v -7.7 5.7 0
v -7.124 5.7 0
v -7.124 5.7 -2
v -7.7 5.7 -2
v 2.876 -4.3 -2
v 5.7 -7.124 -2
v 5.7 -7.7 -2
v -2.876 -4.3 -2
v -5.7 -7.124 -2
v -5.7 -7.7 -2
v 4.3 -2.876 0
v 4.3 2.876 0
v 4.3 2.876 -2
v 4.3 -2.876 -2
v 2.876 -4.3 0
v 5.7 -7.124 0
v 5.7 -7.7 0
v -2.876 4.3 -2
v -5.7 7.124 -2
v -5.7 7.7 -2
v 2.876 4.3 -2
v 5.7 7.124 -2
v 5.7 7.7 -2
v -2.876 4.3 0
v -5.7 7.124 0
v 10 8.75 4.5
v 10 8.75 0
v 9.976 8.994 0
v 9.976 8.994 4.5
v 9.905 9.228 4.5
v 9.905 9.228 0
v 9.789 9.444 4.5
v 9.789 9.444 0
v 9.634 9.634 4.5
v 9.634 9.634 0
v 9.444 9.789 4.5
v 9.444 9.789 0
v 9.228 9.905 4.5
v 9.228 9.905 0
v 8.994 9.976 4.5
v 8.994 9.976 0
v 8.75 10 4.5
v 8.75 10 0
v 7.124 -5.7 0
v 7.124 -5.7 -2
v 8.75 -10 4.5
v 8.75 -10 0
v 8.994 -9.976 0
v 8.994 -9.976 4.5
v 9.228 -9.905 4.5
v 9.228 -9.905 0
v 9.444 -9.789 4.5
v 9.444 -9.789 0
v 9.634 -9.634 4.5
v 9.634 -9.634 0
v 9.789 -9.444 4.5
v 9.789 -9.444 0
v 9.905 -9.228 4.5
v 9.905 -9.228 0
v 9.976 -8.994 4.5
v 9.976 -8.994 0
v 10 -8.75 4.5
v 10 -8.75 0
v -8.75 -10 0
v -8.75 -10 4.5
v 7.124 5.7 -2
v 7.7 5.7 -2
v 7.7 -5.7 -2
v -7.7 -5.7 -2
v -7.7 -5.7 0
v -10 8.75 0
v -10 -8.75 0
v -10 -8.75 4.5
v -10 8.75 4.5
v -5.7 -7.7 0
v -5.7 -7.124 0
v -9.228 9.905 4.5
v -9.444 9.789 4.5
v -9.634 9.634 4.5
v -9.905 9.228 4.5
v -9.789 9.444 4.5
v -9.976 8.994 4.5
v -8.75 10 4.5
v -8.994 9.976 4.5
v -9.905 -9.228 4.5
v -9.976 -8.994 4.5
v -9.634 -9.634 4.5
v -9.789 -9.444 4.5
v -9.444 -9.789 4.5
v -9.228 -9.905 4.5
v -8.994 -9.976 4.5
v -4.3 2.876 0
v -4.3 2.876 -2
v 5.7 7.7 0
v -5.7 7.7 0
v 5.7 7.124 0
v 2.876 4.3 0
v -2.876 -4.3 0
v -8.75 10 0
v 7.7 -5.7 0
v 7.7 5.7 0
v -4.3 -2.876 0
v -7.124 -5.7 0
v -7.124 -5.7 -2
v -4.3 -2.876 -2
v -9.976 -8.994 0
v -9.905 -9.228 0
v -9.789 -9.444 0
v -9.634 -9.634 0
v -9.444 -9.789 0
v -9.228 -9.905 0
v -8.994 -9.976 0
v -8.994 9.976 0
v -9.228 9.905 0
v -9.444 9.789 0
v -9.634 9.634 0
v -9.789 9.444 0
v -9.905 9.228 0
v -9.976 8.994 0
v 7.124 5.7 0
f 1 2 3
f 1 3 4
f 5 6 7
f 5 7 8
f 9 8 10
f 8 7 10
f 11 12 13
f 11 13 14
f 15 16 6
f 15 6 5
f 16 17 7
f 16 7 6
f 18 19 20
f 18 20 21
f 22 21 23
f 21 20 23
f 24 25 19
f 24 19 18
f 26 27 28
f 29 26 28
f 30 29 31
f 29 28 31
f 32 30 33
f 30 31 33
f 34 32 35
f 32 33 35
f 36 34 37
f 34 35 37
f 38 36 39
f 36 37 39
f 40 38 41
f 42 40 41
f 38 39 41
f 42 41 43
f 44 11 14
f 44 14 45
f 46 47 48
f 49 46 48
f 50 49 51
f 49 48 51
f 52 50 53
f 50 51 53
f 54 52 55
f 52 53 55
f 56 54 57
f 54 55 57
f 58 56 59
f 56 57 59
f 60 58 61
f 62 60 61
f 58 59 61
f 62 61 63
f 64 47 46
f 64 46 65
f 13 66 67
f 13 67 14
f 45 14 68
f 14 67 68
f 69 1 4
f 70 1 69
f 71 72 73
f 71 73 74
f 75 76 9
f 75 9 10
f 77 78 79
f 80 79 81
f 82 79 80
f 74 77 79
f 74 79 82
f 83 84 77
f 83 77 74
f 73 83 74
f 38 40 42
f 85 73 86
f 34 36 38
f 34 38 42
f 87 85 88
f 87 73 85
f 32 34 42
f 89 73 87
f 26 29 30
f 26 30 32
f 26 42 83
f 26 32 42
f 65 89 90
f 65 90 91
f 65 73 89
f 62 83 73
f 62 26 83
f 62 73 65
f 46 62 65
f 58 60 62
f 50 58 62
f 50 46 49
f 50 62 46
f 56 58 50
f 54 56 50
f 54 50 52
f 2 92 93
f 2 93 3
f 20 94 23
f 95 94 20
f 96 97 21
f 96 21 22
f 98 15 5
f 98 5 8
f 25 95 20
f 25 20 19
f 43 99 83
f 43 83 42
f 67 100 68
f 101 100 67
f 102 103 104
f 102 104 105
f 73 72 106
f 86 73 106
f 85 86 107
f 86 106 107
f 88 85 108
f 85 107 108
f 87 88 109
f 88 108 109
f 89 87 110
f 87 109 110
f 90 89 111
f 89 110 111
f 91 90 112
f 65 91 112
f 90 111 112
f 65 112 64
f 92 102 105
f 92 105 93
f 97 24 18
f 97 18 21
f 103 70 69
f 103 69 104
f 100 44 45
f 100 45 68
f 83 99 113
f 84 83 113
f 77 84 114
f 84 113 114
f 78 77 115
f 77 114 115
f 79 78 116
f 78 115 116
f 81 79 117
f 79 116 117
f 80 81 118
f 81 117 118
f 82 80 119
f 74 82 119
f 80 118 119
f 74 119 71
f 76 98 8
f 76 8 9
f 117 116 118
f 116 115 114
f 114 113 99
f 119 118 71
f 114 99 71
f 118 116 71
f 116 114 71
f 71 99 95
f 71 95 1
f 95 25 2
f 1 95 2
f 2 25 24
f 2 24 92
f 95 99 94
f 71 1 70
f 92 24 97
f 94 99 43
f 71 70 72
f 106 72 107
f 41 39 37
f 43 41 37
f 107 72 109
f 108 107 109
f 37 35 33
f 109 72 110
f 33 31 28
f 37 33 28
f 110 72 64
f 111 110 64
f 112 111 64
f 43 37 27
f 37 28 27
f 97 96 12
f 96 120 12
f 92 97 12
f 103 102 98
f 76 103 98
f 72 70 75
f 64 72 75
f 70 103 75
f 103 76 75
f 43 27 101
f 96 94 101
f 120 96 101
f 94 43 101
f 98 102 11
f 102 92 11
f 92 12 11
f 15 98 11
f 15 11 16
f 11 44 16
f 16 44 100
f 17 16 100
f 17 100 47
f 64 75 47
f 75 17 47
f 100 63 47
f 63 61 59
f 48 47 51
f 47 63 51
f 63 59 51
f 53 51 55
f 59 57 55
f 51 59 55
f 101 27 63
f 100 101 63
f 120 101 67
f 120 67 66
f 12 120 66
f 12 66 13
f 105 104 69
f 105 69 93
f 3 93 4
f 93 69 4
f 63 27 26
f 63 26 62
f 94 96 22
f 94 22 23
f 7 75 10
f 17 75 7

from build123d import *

# Parameters (mm, degrees)
PAD087_DEPTH          = 4.5
POLARPATTERN008_COUNT = 4
PAD088_DEPTH          = 2
POLARPATTERN009_COUNT = 4


with BuildPart() as part:
    # Sketch179 → Pad087 (new body)
    with BuildSketch(Plane.XY):
        with BuildLine():
            Line((0, 0), (0, 10))
            Line((-8.75, 10), (0, 10))
            ThreePointArc((-8.75, 10), (-9.633883, 9.633883), (-10, 8.75))
            Line((-10, 0), (-10, 8.75))
            Line((0, 0), (-10, 0))
        make_face()
    pad087 = extrude(amount=PAD087_DEPTH)

    # PolarPattern008: Pad087 ×4 about axis
    polarpattern008_axis = Axis((0, 0, 0), (0, 0, 1))
    for i in range(1, POLARPATTERN008_COUNT):
        add(pad087.rotate(polarpattern008_axis, i * 360 / POLARPATTERN008_COUNT))

    # Sketch178 → Pad088 (join)
    with BuildSketch(Plane.XY):
        Polygon((-5.7, 7.124264), (-2.875736, 4.3), (2.875736, 4.3), (5.7, 7.124264), (5.7, 7.7), (-5.7, 7.7), align=None)
    pad088 = extrude(amount=-PAD088_DEPTH)

    # PolarPattern009: Pad088 ×4 about axis
    polarpattern009_axis = Axis((0, 0, 0), (0, 0, 1))
    for i in range(1, POLARPATTERN009_COUNT):
        add(pad088.rotate(polarpattern009_axis, i * 360 / POLARPATTERN009_COUNT))


solid = part.part
